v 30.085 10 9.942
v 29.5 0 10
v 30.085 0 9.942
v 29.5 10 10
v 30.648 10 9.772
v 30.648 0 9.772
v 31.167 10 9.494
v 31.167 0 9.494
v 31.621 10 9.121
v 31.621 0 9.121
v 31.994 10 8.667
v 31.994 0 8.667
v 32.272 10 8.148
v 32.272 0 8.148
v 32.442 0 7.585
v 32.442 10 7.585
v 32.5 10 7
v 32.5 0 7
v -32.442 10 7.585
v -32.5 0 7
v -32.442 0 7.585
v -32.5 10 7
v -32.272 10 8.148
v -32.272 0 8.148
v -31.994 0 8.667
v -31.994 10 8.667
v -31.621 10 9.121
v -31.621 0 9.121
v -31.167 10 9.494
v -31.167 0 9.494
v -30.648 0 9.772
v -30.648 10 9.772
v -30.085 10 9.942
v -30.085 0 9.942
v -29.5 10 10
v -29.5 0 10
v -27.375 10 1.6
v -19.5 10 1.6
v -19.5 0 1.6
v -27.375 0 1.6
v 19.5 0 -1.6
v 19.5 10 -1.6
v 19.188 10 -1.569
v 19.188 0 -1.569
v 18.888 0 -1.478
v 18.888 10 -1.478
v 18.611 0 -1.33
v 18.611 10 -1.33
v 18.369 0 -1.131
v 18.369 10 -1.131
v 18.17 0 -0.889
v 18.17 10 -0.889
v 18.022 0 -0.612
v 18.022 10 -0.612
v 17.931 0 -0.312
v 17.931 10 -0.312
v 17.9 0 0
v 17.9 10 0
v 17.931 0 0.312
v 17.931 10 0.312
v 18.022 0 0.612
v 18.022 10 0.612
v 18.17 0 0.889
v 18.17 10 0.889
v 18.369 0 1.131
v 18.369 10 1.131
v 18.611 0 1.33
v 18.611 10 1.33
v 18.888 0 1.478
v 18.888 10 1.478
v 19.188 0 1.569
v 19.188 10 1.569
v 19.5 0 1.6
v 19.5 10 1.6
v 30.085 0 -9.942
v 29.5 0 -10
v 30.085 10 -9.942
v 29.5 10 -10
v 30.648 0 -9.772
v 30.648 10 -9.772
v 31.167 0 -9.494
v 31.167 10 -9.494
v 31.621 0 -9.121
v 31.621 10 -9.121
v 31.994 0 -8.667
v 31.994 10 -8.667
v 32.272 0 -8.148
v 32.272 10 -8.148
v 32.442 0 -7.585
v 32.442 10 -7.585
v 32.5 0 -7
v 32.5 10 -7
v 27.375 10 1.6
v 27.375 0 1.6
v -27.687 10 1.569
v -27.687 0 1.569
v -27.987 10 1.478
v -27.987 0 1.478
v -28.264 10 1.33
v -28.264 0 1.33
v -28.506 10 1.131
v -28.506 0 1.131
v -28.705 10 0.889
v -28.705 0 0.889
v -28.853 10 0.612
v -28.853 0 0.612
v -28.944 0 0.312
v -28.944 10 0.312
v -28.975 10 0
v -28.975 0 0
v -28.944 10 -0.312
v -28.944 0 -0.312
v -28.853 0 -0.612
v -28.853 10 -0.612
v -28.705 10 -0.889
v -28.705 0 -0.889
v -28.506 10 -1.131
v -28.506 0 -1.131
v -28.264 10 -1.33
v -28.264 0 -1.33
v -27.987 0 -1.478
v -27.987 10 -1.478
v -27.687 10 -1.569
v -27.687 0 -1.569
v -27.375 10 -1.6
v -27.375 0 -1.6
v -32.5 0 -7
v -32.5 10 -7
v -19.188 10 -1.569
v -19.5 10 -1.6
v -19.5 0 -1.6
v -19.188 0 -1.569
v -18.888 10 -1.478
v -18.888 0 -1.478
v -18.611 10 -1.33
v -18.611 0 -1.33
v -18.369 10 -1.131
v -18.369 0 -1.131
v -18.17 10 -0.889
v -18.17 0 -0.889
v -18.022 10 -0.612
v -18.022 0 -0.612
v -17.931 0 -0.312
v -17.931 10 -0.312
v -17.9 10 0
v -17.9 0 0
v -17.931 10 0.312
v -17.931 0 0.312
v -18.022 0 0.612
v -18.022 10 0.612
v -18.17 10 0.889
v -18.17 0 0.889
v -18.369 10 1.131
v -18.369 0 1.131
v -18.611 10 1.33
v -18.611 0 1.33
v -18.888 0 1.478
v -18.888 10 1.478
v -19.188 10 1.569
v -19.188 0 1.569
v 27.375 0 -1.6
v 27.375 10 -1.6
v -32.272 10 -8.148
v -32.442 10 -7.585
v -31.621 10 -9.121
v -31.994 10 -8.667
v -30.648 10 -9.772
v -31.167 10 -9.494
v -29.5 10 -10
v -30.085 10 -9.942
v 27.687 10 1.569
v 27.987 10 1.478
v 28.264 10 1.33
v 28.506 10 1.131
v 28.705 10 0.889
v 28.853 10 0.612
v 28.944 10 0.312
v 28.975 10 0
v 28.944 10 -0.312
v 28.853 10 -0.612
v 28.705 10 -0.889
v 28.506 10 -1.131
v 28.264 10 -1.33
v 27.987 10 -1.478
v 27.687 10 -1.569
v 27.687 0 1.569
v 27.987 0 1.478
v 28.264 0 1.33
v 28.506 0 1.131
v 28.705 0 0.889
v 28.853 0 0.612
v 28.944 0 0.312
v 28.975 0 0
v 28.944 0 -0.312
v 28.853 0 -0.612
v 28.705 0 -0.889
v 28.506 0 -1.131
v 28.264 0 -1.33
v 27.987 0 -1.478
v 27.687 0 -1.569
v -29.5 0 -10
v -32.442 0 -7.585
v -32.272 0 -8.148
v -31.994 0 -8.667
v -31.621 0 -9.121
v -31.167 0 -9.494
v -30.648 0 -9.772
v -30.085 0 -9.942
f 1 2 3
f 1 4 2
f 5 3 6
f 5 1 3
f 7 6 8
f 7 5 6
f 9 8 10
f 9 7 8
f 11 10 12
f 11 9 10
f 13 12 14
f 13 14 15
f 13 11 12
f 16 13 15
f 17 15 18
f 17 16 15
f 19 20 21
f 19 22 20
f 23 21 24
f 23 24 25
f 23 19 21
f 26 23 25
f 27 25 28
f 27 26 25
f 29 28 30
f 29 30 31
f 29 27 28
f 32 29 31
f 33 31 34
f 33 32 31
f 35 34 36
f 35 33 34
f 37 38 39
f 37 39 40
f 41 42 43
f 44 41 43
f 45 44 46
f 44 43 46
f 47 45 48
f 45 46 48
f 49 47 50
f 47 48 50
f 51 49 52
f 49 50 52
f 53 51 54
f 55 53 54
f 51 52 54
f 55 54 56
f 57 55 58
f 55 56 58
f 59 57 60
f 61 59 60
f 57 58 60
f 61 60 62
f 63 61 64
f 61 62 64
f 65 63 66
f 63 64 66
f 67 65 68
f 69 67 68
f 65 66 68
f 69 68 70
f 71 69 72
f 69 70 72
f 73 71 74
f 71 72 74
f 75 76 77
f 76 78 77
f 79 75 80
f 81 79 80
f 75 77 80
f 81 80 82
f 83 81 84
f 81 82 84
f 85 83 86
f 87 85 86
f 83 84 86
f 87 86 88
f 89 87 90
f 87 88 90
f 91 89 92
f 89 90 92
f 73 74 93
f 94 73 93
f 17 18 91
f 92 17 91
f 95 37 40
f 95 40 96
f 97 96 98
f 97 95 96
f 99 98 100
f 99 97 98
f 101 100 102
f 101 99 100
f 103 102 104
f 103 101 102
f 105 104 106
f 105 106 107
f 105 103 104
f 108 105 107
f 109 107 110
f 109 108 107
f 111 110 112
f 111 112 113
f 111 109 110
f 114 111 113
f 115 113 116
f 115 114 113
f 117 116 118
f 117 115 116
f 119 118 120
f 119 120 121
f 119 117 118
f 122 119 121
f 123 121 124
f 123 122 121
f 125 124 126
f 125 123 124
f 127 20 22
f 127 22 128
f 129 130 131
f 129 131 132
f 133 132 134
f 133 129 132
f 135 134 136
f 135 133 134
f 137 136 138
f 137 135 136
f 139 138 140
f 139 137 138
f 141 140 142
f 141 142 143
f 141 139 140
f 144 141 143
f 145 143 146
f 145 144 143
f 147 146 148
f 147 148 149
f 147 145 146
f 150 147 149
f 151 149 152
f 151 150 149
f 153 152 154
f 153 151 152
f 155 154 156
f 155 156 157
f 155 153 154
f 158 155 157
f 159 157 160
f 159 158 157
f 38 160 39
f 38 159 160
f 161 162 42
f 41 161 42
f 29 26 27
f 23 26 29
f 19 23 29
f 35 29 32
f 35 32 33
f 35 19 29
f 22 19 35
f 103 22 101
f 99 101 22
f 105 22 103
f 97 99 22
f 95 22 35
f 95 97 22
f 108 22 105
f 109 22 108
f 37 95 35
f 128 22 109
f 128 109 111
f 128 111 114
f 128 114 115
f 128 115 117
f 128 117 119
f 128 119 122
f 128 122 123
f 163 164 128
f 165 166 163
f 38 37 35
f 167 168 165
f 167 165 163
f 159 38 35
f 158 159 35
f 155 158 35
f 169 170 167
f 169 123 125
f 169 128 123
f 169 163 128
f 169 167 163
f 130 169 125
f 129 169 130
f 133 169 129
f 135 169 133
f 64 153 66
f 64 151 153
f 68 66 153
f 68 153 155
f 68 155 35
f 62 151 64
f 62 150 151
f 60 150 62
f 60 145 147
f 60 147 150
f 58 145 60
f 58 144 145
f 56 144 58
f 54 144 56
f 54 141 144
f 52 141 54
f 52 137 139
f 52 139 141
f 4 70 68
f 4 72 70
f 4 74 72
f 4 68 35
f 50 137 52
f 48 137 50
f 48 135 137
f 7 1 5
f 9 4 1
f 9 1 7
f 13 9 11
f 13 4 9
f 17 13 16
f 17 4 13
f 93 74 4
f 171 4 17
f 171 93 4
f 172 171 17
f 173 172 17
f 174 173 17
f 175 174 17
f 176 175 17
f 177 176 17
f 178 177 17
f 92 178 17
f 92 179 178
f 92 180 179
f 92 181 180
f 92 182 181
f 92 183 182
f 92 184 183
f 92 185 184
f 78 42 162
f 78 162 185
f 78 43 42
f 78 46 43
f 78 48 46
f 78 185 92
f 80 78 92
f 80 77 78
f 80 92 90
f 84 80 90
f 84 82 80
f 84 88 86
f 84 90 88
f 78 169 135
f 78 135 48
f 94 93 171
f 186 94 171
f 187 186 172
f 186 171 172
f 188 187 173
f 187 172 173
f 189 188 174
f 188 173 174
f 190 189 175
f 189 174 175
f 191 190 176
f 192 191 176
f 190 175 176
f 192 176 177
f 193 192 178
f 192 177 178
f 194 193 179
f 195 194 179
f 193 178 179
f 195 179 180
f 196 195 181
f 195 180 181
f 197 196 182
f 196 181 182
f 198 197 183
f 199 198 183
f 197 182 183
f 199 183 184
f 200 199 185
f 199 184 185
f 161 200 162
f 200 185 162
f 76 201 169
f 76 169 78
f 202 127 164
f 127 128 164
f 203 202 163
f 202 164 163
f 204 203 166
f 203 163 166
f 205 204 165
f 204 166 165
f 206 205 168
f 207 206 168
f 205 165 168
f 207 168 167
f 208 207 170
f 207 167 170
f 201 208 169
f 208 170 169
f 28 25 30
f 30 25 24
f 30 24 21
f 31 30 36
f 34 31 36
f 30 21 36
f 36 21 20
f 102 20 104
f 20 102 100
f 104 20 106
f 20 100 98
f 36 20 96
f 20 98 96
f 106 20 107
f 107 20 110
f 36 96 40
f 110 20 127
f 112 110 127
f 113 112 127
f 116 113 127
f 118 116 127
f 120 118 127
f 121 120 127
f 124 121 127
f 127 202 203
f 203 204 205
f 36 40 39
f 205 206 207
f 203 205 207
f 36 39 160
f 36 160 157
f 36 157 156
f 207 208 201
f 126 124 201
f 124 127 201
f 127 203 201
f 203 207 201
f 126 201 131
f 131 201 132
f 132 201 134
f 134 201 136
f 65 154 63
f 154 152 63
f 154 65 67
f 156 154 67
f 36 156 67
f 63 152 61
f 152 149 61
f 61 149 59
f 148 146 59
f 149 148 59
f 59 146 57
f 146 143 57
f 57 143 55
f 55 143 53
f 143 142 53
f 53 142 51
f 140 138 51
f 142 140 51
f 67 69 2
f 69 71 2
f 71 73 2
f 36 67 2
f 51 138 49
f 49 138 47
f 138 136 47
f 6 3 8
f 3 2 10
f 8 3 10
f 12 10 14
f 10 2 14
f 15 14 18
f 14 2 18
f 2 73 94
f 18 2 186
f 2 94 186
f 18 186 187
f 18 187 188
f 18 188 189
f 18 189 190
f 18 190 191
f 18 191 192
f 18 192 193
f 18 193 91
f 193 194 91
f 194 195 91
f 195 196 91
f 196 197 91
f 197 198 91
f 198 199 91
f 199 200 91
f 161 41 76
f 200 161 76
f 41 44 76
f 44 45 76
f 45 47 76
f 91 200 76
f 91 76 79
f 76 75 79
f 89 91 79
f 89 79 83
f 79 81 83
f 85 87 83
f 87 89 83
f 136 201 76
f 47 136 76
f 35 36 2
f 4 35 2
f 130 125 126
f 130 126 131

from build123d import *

# Parameters (mm, degrees)
SKETCH_1_W          = 65
SKETCH_1_H          = 20
EXTRUDE_1_DEPTH     = 10
CUT_EXTRUDE_1_DEPTH = 10
FILLET_1_R          = 3


with BuildPart() as part:
    # 草图1 → 凸台-拉伸1 (new body)
    with BuildSketch(Plane(origin=(0, 0, 0), x_dir=(1, 0, 0), z_dir=(0, 1, 0))):
        Rectangle(SKETCH_1_W, SKETCH_1_H)
    extrude(amount=EXTRUDE_1_DEPTH)

    # 草图2 → 切除-拉伸1 (cut)
    with BuildSketch(Plane(origin=(0, 10, 0), x_dir=(1, 0, 0), z_dir=(0, 1, 0))):
        with BuildLine():
            Line((-27.375, 1.6), (-19.5, 1.6))
            ThreePointArc((-19.5, 1.6), (-17.9, 0), (-19.5, -1.6))
            Line((-19.5, -1.6), (-27.375, -1.6))
            ThreePointArc((-27.375, -1.6), (-28.975, 0), (-27.375, 1.6))
        make_face()
        with BuildLine():
            Line((27.375, 1.6), (19.5, 1.6))
            ThreePointArc((19.5, 1.6), (17.9, 0), (19.5, -1.6))
            Line((19.5, -1.6), (27.375, -1.6))
            ThreePointArc((27.375, -1.6), (28.975, 0), (27.375, 1.6))
        make_face()
    extrude(amount=-CUT_EXTRUDE_1_DEPTH, mode=Mode.SUBTRACT)

    # 圆角1
    fillet_1_edges = [part.edges().sort_by_distance(p)[0] for p in [
        (32.5, 5, 10),
        (-32.5, 5, 10),
        (-32.5, 5, -10),
        (32.5, 5, -10),
    ]]
    fillet(fillet_1_edges, radius=FILLET_1_R)


solid = part.part
